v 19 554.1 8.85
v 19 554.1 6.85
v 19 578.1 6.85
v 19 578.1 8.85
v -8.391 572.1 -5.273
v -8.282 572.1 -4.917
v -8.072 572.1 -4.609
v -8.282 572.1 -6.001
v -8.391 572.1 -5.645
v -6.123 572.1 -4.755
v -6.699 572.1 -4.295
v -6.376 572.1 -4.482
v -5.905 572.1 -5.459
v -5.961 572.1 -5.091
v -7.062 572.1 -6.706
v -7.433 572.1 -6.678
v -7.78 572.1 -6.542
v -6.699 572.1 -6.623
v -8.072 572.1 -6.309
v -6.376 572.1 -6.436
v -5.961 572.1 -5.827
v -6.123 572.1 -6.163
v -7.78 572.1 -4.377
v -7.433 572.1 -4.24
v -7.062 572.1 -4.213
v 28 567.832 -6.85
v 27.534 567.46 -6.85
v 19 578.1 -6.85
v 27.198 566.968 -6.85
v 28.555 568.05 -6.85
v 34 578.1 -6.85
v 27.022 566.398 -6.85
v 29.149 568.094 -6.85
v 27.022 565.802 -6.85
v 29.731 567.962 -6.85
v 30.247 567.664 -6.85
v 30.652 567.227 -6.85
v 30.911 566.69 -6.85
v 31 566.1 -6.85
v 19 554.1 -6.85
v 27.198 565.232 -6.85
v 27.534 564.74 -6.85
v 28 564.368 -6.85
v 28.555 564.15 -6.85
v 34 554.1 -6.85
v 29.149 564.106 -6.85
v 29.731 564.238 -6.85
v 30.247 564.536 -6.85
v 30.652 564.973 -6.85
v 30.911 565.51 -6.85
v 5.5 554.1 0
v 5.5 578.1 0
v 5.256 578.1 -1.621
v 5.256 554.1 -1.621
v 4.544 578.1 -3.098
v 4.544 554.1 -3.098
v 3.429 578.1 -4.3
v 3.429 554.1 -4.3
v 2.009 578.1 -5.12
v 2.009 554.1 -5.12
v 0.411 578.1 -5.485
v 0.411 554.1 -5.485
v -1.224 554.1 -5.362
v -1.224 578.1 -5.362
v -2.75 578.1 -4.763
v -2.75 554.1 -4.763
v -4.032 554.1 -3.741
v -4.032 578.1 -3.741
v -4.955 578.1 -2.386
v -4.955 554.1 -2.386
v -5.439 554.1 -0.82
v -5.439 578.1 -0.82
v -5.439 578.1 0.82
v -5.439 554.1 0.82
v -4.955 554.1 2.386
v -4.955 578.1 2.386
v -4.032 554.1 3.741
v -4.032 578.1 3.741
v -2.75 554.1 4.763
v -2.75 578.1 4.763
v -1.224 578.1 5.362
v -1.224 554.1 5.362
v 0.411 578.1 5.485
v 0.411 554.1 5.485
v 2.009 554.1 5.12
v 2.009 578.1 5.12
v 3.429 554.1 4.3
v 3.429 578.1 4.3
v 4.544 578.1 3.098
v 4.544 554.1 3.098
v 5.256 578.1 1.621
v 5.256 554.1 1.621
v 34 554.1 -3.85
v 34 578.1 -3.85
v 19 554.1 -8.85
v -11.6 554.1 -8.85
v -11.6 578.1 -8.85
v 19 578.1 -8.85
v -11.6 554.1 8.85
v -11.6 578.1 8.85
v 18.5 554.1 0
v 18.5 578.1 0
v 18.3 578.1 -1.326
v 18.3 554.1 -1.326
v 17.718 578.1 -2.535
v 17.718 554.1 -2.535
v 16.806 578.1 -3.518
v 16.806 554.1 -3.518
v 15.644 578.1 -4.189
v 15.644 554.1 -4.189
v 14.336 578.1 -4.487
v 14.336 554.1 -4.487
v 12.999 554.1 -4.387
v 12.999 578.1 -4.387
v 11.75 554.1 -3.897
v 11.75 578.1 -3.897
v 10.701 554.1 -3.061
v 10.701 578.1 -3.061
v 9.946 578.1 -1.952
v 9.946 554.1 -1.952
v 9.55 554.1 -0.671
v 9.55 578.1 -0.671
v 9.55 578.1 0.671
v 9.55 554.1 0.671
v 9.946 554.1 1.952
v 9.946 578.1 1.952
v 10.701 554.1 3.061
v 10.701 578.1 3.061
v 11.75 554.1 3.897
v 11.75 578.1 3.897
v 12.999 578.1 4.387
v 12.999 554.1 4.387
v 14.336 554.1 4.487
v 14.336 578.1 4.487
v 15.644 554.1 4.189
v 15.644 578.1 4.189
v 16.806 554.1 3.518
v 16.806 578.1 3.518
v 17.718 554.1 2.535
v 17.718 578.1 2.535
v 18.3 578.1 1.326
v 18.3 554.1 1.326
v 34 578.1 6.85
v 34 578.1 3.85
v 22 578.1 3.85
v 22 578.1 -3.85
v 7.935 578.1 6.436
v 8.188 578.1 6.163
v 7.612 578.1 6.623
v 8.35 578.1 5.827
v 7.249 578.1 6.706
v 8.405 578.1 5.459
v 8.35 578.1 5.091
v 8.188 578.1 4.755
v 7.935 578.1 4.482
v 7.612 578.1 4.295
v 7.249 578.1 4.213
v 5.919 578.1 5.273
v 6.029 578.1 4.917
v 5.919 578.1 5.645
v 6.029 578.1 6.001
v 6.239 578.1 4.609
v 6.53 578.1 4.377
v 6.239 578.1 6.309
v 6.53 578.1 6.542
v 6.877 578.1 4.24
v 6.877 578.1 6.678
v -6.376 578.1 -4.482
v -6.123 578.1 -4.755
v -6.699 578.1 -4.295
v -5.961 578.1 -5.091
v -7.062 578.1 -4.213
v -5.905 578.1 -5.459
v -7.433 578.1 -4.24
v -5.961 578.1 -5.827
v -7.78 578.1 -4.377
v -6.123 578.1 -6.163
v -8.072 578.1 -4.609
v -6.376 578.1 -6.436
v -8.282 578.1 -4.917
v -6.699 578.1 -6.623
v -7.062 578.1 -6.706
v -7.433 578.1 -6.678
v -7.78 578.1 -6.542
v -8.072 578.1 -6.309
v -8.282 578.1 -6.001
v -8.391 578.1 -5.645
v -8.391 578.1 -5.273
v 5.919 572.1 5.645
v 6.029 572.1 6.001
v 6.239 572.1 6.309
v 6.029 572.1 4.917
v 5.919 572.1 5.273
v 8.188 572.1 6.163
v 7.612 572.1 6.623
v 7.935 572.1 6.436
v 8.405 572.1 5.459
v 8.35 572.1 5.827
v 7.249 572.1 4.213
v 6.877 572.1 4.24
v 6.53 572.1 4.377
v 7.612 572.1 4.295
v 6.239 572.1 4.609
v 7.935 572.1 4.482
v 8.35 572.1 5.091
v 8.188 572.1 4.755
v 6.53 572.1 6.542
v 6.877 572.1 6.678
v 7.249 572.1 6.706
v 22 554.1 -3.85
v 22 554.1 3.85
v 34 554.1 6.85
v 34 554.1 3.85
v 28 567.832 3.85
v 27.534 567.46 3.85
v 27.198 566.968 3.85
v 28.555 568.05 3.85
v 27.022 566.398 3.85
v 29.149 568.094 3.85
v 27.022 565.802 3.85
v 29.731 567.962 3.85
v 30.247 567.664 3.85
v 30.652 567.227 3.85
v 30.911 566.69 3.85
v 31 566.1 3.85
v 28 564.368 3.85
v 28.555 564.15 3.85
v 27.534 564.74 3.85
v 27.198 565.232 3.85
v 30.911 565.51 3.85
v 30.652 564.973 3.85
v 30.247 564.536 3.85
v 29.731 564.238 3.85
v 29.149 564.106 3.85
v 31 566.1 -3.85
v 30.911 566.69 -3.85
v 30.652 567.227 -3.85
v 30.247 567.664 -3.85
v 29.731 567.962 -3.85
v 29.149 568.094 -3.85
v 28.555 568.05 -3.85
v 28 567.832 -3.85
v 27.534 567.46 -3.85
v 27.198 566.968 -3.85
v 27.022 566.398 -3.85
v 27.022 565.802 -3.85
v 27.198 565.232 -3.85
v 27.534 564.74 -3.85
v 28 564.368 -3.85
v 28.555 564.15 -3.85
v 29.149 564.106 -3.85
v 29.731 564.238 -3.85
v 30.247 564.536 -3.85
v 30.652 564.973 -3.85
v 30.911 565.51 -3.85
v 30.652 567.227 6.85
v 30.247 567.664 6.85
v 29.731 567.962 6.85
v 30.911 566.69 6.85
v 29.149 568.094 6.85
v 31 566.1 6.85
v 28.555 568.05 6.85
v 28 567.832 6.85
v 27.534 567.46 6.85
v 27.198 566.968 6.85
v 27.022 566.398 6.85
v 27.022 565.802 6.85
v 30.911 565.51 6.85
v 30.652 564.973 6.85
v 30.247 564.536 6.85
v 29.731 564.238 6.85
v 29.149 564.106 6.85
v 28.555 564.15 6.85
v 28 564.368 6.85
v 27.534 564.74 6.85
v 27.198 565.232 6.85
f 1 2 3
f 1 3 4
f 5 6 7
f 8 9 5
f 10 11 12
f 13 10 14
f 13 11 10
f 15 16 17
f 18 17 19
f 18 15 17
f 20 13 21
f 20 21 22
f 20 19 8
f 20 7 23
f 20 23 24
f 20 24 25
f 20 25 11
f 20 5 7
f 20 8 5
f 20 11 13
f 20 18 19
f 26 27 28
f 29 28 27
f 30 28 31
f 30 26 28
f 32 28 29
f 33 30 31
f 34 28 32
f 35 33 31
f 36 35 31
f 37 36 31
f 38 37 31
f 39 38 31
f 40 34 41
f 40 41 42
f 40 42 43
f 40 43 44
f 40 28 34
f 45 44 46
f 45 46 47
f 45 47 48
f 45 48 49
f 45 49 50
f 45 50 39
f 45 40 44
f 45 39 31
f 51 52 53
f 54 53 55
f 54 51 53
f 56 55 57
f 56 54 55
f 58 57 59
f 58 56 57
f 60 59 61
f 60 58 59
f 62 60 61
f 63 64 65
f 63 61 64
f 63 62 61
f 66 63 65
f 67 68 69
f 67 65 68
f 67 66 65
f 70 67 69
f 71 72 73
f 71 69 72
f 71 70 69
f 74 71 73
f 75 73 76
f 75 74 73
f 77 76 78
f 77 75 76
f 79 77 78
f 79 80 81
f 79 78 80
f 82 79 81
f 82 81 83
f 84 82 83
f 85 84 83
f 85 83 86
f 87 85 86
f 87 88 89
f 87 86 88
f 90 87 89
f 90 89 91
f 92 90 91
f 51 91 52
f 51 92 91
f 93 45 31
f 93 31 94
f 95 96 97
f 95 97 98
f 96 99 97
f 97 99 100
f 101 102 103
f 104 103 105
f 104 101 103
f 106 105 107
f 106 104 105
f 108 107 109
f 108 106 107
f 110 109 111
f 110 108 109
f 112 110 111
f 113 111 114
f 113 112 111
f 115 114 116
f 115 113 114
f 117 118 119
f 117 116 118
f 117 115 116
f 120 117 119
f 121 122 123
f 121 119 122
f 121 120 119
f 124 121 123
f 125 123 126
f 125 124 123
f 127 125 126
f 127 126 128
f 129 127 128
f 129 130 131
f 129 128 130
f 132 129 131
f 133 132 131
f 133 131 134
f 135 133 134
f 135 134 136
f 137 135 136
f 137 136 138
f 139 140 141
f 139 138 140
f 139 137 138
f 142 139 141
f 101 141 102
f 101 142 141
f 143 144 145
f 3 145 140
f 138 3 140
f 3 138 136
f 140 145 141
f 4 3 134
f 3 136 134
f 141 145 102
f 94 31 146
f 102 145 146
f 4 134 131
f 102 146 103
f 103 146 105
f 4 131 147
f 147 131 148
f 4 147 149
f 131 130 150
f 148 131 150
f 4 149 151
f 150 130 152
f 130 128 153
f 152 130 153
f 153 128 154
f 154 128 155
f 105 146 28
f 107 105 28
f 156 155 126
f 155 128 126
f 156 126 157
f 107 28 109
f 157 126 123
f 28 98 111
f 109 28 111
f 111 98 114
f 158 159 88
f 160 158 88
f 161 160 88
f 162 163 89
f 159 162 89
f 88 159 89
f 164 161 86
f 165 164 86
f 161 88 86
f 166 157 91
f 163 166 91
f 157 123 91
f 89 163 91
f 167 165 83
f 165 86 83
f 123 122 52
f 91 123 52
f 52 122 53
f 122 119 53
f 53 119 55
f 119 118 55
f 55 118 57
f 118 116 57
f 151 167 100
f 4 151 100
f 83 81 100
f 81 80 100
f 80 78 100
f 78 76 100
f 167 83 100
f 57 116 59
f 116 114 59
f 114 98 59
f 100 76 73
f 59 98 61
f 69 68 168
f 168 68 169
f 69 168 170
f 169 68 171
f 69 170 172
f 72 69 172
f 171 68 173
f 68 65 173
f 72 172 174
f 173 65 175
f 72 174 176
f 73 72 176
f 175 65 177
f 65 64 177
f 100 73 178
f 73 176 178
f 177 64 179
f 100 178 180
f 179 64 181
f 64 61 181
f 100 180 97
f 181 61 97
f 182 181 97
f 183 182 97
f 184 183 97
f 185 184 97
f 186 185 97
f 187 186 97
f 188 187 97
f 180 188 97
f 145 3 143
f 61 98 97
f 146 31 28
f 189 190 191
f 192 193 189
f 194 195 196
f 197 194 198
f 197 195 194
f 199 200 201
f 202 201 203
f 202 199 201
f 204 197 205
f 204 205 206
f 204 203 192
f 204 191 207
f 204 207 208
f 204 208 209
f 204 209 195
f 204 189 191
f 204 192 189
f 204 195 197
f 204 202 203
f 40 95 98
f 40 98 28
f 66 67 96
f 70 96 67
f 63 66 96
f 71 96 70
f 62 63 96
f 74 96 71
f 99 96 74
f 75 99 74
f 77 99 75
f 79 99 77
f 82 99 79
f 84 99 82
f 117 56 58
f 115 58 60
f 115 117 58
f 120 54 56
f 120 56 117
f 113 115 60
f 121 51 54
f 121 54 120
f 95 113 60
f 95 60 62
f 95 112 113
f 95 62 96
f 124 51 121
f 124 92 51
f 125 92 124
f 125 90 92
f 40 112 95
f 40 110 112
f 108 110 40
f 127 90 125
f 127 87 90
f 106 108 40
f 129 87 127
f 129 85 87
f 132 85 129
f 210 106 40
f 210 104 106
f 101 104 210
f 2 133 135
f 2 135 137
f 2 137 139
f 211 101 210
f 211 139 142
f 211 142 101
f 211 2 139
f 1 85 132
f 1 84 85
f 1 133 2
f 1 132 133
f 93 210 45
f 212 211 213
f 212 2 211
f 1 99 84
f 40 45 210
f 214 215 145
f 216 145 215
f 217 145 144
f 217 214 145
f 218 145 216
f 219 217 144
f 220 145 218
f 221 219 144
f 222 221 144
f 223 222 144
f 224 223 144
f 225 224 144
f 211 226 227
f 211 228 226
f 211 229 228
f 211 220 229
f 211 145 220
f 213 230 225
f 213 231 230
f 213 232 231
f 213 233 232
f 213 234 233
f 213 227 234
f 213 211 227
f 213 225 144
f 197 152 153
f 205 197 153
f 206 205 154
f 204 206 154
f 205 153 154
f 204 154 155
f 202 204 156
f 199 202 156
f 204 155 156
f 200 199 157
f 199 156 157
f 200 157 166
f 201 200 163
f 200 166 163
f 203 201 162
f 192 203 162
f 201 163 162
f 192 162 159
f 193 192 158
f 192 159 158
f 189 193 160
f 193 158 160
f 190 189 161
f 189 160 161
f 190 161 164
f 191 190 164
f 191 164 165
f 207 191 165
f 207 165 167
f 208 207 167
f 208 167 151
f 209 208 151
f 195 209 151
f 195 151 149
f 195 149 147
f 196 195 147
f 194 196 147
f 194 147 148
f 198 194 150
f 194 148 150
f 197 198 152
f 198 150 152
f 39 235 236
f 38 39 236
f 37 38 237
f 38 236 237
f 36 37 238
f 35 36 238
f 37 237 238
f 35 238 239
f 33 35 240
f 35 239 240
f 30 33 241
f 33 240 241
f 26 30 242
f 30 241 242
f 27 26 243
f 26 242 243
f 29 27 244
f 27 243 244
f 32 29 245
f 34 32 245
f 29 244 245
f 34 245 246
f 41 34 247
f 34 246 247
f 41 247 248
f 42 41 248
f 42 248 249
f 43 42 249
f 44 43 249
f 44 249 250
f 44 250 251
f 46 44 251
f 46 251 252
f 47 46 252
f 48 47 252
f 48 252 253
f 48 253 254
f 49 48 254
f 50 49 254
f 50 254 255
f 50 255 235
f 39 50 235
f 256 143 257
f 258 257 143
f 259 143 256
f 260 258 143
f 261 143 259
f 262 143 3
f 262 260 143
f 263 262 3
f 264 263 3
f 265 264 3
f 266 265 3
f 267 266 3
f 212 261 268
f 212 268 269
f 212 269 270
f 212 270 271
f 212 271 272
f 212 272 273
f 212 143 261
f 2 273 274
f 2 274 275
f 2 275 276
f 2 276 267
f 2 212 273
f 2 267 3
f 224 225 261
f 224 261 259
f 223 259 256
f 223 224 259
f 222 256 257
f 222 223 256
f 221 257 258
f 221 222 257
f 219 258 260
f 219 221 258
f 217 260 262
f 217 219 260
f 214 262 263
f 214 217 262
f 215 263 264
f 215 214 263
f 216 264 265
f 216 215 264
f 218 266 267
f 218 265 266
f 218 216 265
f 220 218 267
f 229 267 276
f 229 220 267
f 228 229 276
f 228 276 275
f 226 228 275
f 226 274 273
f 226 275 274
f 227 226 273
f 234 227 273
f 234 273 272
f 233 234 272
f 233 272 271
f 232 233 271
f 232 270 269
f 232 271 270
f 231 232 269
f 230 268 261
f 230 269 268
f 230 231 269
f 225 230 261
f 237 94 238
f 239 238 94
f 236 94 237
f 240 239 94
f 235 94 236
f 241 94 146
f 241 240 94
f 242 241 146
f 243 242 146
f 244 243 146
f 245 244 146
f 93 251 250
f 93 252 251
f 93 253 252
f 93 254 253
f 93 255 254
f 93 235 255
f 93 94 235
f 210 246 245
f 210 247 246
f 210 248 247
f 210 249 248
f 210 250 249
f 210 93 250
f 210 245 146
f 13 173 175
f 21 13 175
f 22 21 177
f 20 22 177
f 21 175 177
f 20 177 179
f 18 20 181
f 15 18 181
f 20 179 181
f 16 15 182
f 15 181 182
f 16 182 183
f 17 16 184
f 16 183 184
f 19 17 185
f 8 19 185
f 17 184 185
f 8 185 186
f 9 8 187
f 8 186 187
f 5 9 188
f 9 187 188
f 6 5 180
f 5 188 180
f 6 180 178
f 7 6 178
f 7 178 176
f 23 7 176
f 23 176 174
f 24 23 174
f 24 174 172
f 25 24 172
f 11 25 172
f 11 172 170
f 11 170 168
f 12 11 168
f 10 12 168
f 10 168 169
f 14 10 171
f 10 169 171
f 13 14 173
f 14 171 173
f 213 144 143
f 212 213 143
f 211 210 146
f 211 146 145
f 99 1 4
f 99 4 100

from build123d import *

# Parameters (mm, degrees)
SKIZZE3_R                            = 5.5
SKIZZE3_R_2                          = 4.5
AUFSATZ_LINEAR_AUSTRAGEN1_DEPTH      = 578.1
SKIZZE5_OUTSIDE_W                    = 164.65
SKIZZE5_OUTSIDE_H                    = 696.15
SKIZZE5_OUTSIDE_W_2                  = 45.6
SKIZZE5_OUTSIDE_H_2                  = 24
SKIZZE5_OUTSIDE_R                    = 2
SCHNITT_LINEAR_AUSTRAGEN2_DEPTH      = 9.85
SCHNITT_LINEAR_AUSTRAGEN2_DEPTH_BACK = 9.85
SKETCH2_R                            = 1.25
CUT_EXTRUDE1_DEPTH                   = 6


with BuildPart() as part:
    # Skizze3 → Aufsatz-Linear austragen1 (new body)
    with BuildSketch(Plane(origin=(0, 0, 0), x_dir=(1, 0, 0), z_dir=(0, 1, 0))):
        Polygon((-12.6, -8.85), (-12.6, 8.85), (19, 8.85), (19, 6.85), (34, 6.85), (34, 3.85), (22, 3.85), (22, -3.85), (34, -3.85), (34, -6.85), (19, -6.85), (19, -8.85), align=None)
        Circle(SKIZZE3_R, mode=Mode.SUBTRACT)
        with Locations((14, 0)):
            Circle(SKIZZE3_R_2, mode=Mode.SUBTRACT)
    extrude(amount=AUFSATZ_LINEAR_AUSTRAGEN1_DEPTH)

    # Skizze5 outside → Schnitt-Linear austragen2 (cut, two sides)
    with BuildSketch(Plane.XY) as schnitt_linear_austragen2_sk:
        with Locations((10.7, 289.05)):
            Rectangle(SKIZZE5_OUTSIDE_W, SKIZZE5_OUTSIDE_H)
        with Locations((11.2, 566.1)):
            Rectangle(SKIZZE5_OUTSIDE_W_2, SKIZZE5_OUTSIDE_H_2, mode=Mode.SUBTRACT)
        with Locations((29, 566.1)):
            Circle(SKIZZE5_OUTSIDE_R)
    extrude(amount=SCHNITT_LINEAR_AUSTRAGEN2_DEPTH, mode=Mode.SUBTRACT)
    extrude(schnitt_linear_austragen2_sk.sketch, amount=-SCHNITT_LINEAR_AUSTRAGEN2_DEPTH_BACK, mode=Mode.SUBTRACT)

    # Sketch2 → Cut-Extrude1 (cut)
    with BuildSketch(Plane(origin=(0, 578.1, 0), x_dir=(1, 0, 0), z_dir=(0, 1, 0))):
        with Locations((-7.155344001, 5.459034001)):
            Circle(SKETCH2_R)
        with Locations((7.155344001, -5.459034001)):
            Circle(SKETCH2_R)
    extrude(amount=-CUT_EXTRUDE1_DEPTH, mode=Mode.SUBTRACT)


solid = part.part
